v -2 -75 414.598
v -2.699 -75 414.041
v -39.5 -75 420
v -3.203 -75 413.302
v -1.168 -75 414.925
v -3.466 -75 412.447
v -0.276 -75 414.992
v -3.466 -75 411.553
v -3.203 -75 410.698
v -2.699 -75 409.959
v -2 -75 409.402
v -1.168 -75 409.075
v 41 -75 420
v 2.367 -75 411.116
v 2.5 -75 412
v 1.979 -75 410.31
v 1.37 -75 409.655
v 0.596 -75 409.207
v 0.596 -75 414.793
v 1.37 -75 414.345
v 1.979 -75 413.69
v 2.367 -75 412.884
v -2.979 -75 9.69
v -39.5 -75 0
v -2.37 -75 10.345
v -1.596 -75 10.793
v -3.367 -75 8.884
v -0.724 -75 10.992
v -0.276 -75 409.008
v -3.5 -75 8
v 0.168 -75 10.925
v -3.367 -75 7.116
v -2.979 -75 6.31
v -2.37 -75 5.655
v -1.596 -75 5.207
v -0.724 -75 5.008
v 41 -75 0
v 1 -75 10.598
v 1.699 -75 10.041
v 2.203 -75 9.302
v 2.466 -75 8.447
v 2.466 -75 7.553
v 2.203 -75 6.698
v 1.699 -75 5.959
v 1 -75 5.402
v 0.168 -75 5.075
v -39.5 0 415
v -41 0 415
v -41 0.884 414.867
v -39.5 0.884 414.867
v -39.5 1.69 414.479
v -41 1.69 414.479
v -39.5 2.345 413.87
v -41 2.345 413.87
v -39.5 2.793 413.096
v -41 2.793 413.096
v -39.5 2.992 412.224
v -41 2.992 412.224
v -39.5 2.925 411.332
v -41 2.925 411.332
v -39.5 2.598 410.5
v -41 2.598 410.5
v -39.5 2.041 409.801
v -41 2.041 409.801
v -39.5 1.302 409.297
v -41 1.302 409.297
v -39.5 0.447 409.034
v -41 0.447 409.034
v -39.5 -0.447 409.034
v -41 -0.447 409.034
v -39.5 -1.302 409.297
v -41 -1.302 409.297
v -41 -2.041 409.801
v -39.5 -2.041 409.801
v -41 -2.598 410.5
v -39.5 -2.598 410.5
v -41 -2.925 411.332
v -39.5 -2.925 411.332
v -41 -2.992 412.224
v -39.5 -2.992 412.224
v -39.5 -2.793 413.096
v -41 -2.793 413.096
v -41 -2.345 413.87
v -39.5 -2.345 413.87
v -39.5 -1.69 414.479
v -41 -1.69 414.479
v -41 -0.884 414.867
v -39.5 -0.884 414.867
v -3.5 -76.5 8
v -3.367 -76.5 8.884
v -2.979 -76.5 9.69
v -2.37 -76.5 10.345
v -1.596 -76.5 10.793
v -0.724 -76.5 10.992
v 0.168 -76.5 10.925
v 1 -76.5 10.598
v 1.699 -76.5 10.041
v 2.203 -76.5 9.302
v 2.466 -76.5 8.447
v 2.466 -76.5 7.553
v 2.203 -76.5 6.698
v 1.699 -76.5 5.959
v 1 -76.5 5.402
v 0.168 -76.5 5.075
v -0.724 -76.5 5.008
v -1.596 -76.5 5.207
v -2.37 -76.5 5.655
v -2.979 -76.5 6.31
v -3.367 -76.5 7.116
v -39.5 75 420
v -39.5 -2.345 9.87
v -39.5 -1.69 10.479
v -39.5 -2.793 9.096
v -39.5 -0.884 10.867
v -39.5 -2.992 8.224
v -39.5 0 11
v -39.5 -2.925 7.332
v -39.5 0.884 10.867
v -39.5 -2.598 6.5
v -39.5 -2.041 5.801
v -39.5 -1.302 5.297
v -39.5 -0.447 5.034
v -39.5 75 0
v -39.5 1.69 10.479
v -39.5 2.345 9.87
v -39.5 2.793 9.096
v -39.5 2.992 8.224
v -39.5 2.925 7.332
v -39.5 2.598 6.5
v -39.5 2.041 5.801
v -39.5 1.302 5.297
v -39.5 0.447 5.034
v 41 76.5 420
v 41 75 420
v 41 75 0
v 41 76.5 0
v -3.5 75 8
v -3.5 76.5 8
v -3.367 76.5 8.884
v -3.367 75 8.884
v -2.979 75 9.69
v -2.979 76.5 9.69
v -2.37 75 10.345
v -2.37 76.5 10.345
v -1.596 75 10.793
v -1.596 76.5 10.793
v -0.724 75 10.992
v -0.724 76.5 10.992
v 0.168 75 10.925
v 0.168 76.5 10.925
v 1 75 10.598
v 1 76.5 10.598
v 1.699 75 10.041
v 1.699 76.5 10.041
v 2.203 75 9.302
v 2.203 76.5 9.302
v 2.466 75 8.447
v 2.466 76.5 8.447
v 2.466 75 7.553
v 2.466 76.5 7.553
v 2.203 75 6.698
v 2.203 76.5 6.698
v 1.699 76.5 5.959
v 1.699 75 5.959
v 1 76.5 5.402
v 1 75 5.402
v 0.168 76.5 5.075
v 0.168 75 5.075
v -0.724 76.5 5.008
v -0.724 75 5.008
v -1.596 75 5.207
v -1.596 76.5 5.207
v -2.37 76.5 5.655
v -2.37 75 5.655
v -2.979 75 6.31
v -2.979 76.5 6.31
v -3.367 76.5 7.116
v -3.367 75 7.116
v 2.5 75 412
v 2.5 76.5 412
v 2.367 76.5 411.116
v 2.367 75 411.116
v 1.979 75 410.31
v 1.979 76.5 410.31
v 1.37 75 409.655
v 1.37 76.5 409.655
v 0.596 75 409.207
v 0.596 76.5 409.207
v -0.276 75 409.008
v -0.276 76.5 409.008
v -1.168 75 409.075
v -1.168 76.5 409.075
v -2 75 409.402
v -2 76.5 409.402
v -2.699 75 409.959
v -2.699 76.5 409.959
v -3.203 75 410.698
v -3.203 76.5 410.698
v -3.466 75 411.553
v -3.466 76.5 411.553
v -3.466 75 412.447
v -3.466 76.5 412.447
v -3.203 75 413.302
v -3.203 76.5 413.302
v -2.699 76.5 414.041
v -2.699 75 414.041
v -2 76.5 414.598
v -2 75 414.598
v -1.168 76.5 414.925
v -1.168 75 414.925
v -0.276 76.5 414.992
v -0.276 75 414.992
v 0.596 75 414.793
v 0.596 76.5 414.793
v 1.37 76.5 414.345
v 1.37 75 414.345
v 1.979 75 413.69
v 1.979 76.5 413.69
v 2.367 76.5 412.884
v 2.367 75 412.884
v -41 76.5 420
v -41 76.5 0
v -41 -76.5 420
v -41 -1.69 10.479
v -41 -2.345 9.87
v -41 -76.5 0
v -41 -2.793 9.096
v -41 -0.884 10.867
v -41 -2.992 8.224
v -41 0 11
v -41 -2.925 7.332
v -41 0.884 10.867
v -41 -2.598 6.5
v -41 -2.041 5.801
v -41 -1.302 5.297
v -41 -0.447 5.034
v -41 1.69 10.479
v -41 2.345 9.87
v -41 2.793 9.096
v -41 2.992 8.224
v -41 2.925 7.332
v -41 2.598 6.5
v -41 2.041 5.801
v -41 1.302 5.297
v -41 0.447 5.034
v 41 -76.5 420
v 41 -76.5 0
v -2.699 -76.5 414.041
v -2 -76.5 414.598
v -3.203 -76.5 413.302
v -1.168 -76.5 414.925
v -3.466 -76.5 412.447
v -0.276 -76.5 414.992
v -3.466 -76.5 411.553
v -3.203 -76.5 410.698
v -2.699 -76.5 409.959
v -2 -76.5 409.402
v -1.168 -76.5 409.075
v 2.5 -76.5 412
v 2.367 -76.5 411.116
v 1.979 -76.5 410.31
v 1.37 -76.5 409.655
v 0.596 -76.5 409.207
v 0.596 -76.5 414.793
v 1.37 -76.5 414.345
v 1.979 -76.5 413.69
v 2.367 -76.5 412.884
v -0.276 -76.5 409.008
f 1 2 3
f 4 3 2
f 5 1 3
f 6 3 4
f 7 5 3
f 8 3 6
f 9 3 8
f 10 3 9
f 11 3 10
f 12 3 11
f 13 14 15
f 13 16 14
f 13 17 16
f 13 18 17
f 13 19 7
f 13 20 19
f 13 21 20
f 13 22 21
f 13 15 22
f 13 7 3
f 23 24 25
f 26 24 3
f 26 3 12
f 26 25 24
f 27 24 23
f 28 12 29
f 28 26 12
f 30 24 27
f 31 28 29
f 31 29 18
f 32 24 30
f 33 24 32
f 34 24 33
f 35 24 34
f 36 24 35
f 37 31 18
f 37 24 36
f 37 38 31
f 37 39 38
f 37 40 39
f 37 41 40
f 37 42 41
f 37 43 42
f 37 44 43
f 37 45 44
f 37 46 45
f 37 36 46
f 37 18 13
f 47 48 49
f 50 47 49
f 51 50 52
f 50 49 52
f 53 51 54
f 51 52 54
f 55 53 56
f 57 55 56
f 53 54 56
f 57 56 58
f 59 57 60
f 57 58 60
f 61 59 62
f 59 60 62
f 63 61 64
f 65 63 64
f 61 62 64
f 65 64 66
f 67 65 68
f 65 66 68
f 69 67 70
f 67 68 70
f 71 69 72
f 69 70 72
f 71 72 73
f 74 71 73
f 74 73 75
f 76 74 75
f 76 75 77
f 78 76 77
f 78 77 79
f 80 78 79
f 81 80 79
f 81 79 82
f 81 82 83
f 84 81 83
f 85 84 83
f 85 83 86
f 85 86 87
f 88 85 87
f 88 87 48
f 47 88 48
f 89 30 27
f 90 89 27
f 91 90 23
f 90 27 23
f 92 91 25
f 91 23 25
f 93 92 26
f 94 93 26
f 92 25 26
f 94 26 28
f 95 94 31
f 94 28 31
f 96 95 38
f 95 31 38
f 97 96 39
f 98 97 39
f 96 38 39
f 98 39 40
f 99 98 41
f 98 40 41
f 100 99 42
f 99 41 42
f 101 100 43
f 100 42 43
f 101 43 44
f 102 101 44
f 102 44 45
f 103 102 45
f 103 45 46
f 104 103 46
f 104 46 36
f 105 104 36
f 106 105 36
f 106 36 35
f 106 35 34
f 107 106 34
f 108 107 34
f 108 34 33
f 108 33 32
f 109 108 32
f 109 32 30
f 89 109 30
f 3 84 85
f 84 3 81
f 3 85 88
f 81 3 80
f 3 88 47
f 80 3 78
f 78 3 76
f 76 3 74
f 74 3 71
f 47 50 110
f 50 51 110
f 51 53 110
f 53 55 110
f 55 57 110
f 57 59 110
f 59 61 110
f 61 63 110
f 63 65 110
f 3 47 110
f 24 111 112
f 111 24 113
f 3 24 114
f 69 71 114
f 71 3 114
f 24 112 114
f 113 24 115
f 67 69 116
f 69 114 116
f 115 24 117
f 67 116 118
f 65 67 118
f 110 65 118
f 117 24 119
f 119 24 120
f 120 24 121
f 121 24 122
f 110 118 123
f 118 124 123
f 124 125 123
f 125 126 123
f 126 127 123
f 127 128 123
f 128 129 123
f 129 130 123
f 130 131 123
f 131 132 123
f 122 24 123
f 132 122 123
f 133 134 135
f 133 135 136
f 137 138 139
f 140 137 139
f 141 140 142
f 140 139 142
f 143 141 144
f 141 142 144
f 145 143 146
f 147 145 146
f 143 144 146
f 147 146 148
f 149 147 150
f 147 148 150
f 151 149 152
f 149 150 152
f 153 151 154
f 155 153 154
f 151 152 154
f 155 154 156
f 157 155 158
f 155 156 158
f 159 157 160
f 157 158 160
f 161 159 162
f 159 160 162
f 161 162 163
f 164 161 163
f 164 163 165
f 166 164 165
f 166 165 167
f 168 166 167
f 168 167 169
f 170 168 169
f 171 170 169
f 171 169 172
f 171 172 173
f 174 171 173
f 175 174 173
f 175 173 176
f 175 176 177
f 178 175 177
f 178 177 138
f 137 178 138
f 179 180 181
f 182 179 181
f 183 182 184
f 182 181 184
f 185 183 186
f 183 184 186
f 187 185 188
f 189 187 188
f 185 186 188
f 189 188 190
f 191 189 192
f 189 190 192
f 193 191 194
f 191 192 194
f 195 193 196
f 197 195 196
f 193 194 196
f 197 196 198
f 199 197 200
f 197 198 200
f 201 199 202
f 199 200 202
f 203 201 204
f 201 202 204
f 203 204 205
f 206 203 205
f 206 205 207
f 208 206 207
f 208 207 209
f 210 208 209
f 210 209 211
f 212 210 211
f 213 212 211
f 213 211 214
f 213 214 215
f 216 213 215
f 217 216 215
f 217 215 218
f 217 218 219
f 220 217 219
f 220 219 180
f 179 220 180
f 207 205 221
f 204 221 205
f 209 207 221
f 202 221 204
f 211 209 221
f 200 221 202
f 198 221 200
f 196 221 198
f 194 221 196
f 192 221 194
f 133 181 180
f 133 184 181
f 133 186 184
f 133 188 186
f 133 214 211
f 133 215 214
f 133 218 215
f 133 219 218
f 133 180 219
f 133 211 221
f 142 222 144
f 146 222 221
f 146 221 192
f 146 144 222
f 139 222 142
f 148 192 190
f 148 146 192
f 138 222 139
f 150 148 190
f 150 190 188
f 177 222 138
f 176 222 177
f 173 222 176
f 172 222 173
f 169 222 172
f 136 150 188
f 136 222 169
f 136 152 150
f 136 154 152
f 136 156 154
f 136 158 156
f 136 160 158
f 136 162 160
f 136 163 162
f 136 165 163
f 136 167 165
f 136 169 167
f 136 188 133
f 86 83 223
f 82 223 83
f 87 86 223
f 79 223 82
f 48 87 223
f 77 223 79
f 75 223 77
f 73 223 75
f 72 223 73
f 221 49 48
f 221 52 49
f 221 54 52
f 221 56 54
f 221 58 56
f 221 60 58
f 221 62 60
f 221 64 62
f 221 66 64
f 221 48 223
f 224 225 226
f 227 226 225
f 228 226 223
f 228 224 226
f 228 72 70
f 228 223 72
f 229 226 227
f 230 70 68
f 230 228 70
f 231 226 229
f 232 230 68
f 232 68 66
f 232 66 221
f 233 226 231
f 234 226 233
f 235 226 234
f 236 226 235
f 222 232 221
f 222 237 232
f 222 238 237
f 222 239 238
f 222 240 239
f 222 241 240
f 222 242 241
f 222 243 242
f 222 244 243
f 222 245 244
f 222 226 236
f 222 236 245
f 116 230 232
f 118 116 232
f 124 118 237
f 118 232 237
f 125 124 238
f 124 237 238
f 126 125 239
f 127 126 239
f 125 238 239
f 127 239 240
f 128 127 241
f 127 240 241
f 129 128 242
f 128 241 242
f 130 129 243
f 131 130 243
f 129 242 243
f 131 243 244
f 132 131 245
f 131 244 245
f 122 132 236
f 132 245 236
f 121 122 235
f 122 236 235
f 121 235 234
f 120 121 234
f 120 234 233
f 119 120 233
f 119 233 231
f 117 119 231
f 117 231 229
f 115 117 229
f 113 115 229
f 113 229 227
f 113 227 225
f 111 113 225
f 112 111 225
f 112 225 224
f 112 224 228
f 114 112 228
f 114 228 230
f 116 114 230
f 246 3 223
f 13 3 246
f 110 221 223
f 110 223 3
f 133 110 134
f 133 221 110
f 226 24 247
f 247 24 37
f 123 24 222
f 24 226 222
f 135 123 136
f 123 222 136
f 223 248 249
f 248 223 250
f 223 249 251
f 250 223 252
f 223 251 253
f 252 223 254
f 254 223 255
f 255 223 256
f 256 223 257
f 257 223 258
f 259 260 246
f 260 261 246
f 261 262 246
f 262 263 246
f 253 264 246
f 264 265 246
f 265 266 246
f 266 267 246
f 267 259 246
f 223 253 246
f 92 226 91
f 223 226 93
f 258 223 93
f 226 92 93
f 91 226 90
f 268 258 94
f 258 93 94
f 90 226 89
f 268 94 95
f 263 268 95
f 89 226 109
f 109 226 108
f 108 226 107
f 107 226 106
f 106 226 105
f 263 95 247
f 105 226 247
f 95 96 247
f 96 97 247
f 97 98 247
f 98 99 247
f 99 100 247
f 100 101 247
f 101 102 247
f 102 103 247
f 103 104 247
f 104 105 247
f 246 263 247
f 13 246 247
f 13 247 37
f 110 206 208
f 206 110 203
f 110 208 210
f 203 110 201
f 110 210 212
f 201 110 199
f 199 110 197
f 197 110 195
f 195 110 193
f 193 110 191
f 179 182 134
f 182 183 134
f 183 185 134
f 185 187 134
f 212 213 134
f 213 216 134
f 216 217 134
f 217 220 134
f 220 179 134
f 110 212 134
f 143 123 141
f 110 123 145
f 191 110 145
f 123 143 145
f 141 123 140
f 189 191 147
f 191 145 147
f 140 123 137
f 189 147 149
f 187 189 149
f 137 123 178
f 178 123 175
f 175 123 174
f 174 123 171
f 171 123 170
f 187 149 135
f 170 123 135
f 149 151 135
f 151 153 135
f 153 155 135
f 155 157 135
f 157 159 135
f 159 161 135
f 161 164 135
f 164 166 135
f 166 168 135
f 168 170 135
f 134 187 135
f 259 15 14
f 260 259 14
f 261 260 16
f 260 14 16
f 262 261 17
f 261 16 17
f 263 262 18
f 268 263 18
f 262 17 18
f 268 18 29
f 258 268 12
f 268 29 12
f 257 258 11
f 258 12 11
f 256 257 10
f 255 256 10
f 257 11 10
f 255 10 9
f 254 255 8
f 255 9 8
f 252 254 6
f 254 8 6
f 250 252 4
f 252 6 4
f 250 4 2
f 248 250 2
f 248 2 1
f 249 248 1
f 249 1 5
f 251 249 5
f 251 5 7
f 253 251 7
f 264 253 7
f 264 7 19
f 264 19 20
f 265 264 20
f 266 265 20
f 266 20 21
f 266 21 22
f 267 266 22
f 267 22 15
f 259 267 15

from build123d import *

# Parameters (mm, degrees)
SKETCH1_W           = 82
SKETCH1_H           = 153
BOSS_EXTRUDE1_DEPTH = 420
SHELL1_T            = -1.5
SKETCH4_R           = 3
CUT_EXTRUDE1_DEPTH  = 154
CUT_EXTRUDE2_REACH  = 436.714
SKETCH5_R           = 3


with BuildPart() as part:
    # Sketch1 → Boss-Extrude1 (new body)
    with BuildSketch(Plane.XY):
        Rectangle(SKETCH1_W, SKETCH1_H)
    extrude(amount=BOSS_EXTRUDE1_DEPTH)

    # Shell1
    shell1_openings = [part.faces().sort_by_distance(p)[0] for p in [
        (0, 0, 0),
        (41, 0, 210),
        (0, 0, 420),
    ]]
    offset(amount=SHELL1_T, openings=shell1_openings, kind=Kind.INTERSECTION)

    # Sketch4 → Cut-Extrude1 (cut)
    with BuildSketch(Plane(origin=(0, 76.5, 0), x_dir=(1, 0, 0), z_dir=(0, 1, 0))):
        with Locations((-0.5, -8)):
            Circle(SKETCH4_R)
        with Locations((-0.5, -412)):
            Circle(SKETCH4_R)
    extrude(amount=-CUT_EXTRUDE1_DEPTH, mode=Mode.SUBTRACT)

    # Sketch5 → Cut-Extrude2 (cut, up to next)
    with BuildSketch(Plane.ZY.offset(41), mode=Mode.PRIVATE) as cut_extrude2_sk1:
        with Locations((8, 0)):
            Circle(SKETCH5_R)
    cut_extrude2_tool1 = extrude(cut_extrude2_sk1.sketch, amount=-CUT_EXTRUDE2_REACH, mode=Mode.PRIVATE) & part.part
    # Sketch5 → Cut-Extrude2 (cut, up to next)
    with BuildSketch(Plane.ZY.offset(41), mode=Mode.PRIVATE) as cut_extrude2_sk2:
        with Locations((412, 0)):
            Circle(SKETCH5_R)
    cut_extrude2_tool2 = extrude(cut_extrude2_sk2.sketch, amount=-CUT_EXTRUDE2_REACH, mode=Mode.PRIVATE) & part.part
    add(cut_extrude2_tool1.solids().sort_by_distance((-41, 0, 8))[0], mode=Mode.SUBTRACT)
    add(cut_extrude2_tool2.solids().sort_by_distance((-41, 0, 412))[0], mode=Mode.SUBTRACT)


solid = part.part
